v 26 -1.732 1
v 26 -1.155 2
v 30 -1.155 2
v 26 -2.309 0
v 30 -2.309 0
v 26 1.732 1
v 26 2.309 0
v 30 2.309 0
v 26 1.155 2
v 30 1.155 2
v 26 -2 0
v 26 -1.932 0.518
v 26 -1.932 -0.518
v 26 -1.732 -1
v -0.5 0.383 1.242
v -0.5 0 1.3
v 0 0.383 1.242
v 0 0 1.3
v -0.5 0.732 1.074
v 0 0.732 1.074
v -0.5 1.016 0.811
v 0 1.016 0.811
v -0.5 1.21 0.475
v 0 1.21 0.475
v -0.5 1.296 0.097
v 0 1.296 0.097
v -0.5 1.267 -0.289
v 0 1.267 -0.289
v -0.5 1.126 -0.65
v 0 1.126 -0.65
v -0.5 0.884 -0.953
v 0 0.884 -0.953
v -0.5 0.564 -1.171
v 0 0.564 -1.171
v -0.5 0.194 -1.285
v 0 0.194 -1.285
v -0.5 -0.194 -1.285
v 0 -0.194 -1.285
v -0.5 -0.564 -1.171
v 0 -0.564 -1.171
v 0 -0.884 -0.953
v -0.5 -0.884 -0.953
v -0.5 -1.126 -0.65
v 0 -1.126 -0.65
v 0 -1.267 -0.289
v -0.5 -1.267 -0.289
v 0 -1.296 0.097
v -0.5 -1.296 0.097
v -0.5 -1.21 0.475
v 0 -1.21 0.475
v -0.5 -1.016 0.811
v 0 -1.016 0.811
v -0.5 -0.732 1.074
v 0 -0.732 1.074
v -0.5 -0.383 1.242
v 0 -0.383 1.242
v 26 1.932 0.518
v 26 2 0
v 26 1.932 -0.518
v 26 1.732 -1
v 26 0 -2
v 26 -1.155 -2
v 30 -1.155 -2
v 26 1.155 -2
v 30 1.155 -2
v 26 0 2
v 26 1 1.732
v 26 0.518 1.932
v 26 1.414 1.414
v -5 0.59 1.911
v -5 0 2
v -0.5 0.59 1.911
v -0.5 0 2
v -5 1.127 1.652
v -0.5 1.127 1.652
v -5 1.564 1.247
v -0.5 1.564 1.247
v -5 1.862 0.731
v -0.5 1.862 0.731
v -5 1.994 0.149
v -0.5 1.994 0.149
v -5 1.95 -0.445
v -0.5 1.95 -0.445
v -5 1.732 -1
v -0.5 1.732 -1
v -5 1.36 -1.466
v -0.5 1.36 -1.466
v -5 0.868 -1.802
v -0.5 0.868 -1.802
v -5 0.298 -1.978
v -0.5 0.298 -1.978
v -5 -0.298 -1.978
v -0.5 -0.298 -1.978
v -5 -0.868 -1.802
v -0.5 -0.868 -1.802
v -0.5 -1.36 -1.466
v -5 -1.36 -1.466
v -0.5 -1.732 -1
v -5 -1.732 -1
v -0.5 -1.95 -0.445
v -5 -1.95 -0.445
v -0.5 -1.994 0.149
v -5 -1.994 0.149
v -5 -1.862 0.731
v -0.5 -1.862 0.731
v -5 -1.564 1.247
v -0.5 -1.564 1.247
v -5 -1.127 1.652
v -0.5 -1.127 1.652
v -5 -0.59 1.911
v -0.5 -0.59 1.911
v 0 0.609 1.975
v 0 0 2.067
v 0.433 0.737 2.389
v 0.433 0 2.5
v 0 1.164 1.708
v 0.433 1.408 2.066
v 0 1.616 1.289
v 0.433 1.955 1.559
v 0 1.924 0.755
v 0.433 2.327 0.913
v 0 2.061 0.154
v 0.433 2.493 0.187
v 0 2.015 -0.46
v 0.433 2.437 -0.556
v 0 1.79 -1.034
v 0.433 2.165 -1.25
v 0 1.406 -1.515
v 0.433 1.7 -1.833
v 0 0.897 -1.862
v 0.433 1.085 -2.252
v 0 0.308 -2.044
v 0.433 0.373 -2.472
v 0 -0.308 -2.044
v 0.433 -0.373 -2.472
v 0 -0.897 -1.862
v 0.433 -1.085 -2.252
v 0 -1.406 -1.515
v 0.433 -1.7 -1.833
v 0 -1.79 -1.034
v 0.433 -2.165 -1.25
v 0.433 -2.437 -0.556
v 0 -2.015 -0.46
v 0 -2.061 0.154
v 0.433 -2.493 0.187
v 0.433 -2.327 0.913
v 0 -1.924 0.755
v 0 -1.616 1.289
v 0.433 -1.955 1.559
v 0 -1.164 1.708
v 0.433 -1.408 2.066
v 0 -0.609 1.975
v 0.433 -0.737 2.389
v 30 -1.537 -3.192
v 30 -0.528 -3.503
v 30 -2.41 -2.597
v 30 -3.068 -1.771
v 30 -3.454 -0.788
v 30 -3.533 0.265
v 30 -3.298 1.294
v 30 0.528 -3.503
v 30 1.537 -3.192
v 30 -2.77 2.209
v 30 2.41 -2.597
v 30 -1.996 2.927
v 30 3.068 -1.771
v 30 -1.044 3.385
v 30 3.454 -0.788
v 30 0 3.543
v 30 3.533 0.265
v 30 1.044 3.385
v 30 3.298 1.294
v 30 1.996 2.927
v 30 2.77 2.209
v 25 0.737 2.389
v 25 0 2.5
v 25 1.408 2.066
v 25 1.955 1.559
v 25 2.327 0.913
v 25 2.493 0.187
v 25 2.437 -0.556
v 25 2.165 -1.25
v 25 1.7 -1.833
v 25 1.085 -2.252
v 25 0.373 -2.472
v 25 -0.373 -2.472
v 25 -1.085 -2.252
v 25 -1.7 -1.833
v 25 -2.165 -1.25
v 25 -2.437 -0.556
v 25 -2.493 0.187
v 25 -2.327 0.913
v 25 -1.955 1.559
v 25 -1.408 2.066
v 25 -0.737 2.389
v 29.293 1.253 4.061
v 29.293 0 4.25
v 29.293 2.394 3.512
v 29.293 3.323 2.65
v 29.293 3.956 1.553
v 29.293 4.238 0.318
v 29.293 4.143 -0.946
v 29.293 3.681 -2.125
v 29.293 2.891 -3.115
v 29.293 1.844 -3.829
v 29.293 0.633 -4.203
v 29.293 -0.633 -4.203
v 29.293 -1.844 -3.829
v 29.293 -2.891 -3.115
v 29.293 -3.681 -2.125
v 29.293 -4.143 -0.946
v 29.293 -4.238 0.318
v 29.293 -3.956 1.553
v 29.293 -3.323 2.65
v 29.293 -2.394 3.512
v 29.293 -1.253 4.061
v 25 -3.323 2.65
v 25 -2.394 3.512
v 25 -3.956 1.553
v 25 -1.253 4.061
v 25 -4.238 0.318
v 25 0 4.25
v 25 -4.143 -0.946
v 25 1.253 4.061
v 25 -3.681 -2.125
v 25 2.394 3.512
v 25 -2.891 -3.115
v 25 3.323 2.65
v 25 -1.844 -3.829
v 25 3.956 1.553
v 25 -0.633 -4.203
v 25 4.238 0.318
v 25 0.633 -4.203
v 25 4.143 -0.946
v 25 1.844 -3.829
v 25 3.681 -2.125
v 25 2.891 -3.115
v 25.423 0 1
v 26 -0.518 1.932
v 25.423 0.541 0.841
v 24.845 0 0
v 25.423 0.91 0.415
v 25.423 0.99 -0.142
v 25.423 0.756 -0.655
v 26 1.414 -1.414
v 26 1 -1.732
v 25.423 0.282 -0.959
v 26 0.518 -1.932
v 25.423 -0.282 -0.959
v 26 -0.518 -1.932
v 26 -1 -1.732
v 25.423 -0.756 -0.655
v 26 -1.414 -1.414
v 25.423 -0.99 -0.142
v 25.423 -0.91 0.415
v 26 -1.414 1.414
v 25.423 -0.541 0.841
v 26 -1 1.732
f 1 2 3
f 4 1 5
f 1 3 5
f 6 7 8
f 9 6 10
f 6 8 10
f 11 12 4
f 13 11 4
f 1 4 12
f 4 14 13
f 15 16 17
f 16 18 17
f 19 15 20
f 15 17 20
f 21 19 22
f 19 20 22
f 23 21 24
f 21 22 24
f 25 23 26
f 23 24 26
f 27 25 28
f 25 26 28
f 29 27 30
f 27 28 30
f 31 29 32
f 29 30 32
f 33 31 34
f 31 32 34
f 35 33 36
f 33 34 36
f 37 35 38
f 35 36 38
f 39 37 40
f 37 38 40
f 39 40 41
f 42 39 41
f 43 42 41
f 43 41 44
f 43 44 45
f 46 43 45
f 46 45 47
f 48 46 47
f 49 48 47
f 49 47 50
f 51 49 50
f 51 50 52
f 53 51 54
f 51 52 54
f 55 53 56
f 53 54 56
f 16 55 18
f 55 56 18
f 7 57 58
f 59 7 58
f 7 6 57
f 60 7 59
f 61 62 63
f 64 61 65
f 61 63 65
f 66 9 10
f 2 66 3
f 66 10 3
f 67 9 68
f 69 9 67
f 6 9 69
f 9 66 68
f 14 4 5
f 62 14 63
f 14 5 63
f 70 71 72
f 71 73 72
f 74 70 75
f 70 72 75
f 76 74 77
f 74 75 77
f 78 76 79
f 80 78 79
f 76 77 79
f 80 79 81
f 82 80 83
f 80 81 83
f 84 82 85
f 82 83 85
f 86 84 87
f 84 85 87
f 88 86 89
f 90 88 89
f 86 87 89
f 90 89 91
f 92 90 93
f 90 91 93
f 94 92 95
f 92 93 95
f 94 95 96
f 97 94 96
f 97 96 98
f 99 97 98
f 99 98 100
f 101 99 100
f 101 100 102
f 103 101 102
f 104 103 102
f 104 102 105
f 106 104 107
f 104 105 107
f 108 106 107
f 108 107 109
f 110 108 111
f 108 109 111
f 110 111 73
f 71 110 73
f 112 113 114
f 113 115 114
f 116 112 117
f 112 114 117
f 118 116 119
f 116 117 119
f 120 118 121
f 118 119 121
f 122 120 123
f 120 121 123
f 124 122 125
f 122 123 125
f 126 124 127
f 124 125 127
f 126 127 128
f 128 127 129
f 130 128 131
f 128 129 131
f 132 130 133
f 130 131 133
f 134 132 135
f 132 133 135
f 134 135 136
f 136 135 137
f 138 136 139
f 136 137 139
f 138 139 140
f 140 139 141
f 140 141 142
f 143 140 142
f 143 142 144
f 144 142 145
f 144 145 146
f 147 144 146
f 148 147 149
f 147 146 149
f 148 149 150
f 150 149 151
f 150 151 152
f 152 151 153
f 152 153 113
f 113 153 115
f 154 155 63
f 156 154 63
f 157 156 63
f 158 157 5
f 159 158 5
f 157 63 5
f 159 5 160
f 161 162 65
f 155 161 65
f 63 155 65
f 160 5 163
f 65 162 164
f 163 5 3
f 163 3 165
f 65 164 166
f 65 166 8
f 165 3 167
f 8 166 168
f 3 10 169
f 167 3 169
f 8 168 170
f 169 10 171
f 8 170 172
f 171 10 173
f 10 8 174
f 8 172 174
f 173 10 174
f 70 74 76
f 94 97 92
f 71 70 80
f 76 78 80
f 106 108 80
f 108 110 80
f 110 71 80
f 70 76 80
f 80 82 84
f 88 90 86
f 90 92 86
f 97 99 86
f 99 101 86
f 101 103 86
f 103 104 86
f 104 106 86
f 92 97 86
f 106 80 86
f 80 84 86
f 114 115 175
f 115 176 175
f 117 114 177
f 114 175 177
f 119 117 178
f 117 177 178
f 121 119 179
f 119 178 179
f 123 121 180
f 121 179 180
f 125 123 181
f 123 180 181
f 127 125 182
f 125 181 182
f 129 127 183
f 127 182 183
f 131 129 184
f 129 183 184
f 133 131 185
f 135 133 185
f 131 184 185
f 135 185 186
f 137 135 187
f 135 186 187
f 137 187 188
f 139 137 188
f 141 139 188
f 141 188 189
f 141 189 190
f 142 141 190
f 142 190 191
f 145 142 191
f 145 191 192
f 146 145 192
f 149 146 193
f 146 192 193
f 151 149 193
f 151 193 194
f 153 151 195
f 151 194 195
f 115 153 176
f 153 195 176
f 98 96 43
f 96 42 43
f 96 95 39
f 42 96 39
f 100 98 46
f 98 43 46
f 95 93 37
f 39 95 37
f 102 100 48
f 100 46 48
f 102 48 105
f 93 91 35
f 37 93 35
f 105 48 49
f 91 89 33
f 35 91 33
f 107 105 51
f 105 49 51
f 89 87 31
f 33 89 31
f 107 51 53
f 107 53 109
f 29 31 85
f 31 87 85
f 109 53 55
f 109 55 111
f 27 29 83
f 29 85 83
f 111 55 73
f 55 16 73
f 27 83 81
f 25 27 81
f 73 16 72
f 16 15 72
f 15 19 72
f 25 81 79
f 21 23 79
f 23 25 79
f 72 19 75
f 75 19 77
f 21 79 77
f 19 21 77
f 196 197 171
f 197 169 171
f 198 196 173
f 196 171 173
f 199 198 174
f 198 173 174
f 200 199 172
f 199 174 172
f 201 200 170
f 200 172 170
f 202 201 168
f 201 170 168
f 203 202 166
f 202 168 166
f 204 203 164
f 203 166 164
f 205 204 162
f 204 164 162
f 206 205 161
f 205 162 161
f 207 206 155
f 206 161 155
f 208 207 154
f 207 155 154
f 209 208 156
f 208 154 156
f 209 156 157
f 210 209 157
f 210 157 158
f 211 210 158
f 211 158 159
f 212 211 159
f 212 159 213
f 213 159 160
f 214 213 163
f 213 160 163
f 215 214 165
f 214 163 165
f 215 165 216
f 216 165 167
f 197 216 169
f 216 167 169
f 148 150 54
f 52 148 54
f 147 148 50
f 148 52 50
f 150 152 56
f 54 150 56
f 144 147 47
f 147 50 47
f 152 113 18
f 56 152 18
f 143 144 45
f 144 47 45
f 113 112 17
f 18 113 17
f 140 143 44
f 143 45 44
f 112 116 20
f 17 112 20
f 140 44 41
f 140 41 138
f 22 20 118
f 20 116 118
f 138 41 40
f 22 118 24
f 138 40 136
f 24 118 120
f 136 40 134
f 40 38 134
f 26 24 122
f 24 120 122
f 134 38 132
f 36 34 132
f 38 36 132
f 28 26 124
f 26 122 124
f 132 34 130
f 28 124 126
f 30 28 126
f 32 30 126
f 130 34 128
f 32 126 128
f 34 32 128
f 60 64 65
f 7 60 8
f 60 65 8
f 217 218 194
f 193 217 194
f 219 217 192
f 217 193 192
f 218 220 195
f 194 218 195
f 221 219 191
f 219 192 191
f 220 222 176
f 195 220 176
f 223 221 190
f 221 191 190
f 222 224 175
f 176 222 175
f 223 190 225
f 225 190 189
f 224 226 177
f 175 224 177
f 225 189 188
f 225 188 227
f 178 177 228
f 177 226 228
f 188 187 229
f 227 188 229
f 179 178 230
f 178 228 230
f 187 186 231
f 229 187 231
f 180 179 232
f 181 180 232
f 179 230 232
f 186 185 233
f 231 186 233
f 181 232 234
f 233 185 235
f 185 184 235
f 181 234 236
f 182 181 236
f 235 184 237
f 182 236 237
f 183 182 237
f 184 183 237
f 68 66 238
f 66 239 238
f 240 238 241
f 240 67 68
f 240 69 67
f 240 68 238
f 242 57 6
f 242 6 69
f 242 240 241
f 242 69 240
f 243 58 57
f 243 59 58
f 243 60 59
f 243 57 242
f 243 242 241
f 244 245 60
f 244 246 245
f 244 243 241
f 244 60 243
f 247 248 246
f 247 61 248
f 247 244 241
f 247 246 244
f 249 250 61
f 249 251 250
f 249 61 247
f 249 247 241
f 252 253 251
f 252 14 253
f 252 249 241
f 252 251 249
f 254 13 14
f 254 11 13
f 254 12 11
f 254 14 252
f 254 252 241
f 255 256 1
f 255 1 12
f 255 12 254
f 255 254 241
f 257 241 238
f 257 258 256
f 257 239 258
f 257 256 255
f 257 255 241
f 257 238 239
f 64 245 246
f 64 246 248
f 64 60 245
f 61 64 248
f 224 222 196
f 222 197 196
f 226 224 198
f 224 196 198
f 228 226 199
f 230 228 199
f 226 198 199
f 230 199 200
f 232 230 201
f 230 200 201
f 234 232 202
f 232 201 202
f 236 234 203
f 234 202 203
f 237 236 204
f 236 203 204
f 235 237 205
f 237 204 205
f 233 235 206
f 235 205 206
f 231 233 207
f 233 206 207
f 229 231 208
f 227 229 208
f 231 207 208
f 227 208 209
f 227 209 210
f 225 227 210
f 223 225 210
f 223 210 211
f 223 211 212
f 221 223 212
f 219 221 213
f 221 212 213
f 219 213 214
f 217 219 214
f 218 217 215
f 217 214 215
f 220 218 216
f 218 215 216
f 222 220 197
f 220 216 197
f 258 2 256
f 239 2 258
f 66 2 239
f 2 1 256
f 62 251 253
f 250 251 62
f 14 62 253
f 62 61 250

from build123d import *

# Parameters (mm, degrees)
CUT_EXTRUDE_1_DEPTH = 4


with BuildPart() as part:
    # 草图1 → 旋转1 (revolve)
    with BuildSketch(Plane.XY):
        Polygon((-5, 0), (-5, 2), (-0.5, 2), (-0.5, 1.3), (0, 1.3), (0, 2.067), (0.433, 2.5), (25, 2.5), (25, 4.25), (29.292893219, 4.25), (30, 3.542893219), (30, 0), align=None)
    revolve(axis=Axis((30, 0, 0), (-1, 0, 0)))

    # 草图2 → 切除-旋转1 (revolve, cut)
    with BuildSketch(Plane.XY):
        Polygon((24.845299462, 0), (26, 2), (30, 2), (30, 0), align=None)
    revolve(axis=Axis((30, 0, 0), (-1, 0, 0)), mode=Mode.SUBTRACT)

    # 草图3 → 切除-拉伸1 (cut)
    with BuildSketch(Plane(origin=(30, 0, 0), x_dir=(0, 0, -1), z_dir=(1, 0, 0))):
        Polygon((-2, 1.154700538), (-2, -1.154700538), (0, -2.309401077), (2, -1.154700538), (2, 1.154700538), (0, 2.309401077), align=None)
    extrude(amount=-CUT_EXTRUDE_1_DEPTH, mode=Mode.SUBTRACT)


solid = part.part
